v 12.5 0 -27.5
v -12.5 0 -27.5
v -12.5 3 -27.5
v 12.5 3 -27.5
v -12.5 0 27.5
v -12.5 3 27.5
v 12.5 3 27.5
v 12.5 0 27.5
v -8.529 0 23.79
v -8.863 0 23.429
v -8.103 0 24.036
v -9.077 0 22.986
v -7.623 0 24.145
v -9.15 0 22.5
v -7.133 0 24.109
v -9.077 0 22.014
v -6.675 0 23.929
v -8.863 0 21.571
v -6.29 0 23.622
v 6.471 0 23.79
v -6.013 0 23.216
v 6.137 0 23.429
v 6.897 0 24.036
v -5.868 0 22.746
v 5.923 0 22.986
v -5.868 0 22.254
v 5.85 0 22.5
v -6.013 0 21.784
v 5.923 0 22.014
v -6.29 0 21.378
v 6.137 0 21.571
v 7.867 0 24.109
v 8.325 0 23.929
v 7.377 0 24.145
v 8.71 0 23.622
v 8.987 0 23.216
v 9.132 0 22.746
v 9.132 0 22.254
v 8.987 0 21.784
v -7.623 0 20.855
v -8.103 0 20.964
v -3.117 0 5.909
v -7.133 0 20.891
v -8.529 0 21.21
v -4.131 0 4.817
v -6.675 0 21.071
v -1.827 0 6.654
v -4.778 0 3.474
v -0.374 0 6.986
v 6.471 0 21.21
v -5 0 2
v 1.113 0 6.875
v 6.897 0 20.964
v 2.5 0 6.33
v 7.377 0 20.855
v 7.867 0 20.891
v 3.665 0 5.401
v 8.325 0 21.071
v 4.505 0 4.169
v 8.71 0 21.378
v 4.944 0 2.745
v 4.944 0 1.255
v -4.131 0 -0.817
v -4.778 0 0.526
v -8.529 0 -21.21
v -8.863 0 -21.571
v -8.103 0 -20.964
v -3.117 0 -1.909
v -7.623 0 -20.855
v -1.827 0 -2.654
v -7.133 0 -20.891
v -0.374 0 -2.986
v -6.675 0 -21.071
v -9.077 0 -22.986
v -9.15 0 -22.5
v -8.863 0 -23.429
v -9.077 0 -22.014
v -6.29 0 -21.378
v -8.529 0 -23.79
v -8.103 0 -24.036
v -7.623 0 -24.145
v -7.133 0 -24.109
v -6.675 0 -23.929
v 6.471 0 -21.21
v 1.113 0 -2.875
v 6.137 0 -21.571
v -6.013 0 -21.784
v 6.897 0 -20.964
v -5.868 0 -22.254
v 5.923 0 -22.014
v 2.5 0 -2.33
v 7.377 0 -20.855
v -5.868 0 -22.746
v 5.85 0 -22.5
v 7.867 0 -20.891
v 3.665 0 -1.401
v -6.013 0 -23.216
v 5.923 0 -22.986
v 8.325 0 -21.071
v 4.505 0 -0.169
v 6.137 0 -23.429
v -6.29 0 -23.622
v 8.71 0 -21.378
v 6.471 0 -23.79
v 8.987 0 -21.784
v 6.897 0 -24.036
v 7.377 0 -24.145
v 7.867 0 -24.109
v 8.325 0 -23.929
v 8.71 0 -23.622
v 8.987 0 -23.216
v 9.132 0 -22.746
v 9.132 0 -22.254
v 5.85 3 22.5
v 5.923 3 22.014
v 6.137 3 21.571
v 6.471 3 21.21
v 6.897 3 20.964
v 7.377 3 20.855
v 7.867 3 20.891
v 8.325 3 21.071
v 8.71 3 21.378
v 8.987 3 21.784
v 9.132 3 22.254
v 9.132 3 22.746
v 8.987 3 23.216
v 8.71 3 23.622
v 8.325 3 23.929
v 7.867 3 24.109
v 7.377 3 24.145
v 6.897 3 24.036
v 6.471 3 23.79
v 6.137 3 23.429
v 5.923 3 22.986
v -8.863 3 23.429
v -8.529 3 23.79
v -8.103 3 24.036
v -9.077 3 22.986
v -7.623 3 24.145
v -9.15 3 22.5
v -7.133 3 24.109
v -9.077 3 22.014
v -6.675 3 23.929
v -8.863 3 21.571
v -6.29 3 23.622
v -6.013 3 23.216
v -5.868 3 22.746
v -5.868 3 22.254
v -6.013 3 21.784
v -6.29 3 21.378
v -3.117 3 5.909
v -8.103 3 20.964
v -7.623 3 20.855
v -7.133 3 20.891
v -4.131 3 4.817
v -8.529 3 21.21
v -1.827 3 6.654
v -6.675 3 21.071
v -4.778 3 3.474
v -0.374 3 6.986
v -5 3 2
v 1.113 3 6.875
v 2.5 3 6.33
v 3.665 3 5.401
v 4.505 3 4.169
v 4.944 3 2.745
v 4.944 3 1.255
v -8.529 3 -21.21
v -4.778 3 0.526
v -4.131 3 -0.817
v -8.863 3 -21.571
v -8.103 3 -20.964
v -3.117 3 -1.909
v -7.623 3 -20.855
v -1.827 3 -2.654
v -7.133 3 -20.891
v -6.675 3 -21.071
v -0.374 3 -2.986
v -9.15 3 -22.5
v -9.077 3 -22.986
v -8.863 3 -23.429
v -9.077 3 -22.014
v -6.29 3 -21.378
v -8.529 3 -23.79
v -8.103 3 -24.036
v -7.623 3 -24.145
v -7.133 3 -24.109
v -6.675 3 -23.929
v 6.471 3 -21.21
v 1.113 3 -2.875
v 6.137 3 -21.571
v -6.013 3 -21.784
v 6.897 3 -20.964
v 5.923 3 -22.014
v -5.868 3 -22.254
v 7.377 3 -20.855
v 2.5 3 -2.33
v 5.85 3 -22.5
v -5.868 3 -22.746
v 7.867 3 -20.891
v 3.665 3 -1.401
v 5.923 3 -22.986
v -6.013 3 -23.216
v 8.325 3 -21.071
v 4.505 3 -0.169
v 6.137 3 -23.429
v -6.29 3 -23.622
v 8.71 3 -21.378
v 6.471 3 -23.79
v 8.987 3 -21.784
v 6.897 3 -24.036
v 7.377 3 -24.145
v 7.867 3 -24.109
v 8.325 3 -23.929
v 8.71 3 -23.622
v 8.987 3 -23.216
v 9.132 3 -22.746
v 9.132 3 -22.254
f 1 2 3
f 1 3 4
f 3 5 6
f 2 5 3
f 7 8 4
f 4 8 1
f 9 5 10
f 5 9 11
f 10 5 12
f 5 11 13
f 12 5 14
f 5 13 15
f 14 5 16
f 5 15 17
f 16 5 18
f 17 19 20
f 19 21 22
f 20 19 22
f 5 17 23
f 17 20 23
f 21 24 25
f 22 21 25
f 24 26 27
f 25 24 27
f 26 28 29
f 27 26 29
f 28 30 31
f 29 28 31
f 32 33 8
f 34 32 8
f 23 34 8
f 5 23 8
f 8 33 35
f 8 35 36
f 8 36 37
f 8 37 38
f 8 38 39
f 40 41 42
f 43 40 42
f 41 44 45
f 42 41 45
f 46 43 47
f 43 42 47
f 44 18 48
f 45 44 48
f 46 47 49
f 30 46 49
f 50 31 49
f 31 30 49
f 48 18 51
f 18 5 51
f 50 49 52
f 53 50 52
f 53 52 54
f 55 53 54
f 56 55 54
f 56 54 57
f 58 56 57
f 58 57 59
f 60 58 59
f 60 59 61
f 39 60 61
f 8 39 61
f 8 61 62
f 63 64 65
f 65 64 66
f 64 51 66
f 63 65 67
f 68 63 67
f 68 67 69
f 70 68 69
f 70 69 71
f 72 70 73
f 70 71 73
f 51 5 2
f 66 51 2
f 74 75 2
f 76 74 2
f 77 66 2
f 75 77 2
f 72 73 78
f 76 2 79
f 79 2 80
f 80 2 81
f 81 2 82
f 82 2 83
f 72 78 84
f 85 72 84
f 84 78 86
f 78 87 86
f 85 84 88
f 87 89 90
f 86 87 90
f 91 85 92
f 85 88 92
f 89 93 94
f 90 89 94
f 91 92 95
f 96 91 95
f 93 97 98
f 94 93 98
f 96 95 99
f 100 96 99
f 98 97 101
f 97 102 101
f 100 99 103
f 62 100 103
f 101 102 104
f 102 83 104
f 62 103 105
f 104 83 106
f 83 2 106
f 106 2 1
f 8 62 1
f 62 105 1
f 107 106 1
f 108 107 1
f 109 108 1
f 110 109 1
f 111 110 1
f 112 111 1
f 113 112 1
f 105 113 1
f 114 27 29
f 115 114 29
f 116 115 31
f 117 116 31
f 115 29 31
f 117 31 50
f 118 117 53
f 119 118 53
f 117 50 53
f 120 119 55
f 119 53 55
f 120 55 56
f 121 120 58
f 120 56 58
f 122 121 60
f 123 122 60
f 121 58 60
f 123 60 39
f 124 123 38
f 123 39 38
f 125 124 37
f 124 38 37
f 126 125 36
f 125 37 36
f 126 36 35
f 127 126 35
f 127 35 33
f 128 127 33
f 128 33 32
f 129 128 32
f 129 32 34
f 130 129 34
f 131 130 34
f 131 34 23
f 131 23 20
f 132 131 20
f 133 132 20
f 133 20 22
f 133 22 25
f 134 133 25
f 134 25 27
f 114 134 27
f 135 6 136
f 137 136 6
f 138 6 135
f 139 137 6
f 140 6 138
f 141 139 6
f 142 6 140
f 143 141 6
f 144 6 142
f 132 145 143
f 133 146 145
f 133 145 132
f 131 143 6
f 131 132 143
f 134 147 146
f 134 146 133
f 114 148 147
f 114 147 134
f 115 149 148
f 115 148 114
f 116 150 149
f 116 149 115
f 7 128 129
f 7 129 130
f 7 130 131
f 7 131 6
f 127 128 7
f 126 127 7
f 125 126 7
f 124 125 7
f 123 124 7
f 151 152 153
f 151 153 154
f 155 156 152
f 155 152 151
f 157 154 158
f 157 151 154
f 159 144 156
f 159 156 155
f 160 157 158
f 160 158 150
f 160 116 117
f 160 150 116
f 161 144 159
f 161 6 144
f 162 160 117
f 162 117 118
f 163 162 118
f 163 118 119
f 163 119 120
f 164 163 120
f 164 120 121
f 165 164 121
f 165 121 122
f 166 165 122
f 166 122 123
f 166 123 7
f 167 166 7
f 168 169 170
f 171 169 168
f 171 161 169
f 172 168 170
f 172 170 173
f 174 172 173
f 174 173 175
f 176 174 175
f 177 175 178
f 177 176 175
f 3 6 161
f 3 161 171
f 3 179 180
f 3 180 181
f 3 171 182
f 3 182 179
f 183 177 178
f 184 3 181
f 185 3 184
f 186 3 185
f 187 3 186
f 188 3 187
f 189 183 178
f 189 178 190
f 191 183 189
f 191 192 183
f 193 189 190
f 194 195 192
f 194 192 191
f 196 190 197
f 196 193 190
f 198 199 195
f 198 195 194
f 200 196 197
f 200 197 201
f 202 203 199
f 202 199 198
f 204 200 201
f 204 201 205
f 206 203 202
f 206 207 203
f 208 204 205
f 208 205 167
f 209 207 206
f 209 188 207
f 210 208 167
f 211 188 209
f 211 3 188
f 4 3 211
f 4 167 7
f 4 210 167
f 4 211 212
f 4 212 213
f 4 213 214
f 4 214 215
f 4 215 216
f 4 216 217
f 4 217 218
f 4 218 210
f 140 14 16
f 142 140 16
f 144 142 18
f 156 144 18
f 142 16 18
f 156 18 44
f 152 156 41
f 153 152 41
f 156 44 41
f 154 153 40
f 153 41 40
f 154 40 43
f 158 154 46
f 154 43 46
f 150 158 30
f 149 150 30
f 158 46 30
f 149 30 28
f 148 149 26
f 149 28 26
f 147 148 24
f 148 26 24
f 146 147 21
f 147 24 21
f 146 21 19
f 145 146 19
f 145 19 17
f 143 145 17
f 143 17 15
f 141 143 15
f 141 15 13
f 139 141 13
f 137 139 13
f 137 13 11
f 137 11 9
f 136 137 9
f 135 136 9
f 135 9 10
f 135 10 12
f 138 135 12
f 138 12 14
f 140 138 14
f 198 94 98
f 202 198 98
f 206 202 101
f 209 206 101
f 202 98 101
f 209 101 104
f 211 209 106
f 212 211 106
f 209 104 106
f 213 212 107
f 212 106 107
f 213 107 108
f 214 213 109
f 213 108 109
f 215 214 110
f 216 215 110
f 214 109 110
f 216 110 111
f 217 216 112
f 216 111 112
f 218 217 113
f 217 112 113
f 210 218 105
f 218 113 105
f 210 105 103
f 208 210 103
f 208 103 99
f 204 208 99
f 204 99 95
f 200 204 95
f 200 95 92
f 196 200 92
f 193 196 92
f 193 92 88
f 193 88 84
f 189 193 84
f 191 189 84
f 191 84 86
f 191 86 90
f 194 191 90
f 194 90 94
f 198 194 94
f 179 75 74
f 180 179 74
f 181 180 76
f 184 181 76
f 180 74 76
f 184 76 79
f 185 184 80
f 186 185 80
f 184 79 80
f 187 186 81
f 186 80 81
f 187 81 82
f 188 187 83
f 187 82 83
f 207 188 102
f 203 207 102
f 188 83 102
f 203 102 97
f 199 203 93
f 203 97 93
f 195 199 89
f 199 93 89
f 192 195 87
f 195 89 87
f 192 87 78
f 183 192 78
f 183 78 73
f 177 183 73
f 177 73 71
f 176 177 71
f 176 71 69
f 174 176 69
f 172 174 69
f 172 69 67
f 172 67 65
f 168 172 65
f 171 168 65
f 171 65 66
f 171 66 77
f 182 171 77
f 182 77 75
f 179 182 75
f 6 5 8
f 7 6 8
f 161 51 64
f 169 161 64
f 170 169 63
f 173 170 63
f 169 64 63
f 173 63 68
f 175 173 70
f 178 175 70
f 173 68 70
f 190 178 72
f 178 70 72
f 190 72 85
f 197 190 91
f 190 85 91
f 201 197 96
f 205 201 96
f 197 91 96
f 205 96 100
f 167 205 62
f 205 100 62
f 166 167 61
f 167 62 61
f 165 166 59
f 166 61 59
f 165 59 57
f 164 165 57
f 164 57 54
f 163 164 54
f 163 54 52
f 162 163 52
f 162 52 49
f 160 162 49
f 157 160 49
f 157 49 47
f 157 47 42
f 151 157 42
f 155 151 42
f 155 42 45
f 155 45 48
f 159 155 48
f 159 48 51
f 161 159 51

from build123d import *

# Parameters (mm, degrees)
SKETCH_1_W      = 25
SKETCH_1_H      = 55
EXTRUDE_1_DEPTH = 3
HOLE_WIZARD_1_D = 3.3
HOLE_WIZARD_2_D = 10


with BuildPart() as part:
    # 草图1 → 凸台-拉伸1 (new body)
    with BuildSketch(Plane(origin=(0, 0, 0), x_dir=(1, 0, 0), z_dir=(0, 1, 0))):
        Rectangle(SKETCH_1_W, SKETCH_1_H)
    extrude(amount=EXTRUDE_1_DEPTH)

    # 孔1 (through all)
    with Locations(Plane(origin=(0, 3, 0), x_dir=(1, 0, 0), z_dir=(0, 1, 0))):
        with Locations((-7.5, 22.5), (7.5, 22.5), (7.5, -22.5), (-7.5, -22.5)):
            Hole(HOLE_WIZARD_1_D / 2)

    # 孔2 (through all)
    with Locations(Plane(origin=(0, 3, 0), x_dir=(1, 0, 0), z_dir=(0, 1, 0))):
        with Locations((0, -2)):
            Hole(HOLE_WIZARD_2_D / 2)


solid = part.part
